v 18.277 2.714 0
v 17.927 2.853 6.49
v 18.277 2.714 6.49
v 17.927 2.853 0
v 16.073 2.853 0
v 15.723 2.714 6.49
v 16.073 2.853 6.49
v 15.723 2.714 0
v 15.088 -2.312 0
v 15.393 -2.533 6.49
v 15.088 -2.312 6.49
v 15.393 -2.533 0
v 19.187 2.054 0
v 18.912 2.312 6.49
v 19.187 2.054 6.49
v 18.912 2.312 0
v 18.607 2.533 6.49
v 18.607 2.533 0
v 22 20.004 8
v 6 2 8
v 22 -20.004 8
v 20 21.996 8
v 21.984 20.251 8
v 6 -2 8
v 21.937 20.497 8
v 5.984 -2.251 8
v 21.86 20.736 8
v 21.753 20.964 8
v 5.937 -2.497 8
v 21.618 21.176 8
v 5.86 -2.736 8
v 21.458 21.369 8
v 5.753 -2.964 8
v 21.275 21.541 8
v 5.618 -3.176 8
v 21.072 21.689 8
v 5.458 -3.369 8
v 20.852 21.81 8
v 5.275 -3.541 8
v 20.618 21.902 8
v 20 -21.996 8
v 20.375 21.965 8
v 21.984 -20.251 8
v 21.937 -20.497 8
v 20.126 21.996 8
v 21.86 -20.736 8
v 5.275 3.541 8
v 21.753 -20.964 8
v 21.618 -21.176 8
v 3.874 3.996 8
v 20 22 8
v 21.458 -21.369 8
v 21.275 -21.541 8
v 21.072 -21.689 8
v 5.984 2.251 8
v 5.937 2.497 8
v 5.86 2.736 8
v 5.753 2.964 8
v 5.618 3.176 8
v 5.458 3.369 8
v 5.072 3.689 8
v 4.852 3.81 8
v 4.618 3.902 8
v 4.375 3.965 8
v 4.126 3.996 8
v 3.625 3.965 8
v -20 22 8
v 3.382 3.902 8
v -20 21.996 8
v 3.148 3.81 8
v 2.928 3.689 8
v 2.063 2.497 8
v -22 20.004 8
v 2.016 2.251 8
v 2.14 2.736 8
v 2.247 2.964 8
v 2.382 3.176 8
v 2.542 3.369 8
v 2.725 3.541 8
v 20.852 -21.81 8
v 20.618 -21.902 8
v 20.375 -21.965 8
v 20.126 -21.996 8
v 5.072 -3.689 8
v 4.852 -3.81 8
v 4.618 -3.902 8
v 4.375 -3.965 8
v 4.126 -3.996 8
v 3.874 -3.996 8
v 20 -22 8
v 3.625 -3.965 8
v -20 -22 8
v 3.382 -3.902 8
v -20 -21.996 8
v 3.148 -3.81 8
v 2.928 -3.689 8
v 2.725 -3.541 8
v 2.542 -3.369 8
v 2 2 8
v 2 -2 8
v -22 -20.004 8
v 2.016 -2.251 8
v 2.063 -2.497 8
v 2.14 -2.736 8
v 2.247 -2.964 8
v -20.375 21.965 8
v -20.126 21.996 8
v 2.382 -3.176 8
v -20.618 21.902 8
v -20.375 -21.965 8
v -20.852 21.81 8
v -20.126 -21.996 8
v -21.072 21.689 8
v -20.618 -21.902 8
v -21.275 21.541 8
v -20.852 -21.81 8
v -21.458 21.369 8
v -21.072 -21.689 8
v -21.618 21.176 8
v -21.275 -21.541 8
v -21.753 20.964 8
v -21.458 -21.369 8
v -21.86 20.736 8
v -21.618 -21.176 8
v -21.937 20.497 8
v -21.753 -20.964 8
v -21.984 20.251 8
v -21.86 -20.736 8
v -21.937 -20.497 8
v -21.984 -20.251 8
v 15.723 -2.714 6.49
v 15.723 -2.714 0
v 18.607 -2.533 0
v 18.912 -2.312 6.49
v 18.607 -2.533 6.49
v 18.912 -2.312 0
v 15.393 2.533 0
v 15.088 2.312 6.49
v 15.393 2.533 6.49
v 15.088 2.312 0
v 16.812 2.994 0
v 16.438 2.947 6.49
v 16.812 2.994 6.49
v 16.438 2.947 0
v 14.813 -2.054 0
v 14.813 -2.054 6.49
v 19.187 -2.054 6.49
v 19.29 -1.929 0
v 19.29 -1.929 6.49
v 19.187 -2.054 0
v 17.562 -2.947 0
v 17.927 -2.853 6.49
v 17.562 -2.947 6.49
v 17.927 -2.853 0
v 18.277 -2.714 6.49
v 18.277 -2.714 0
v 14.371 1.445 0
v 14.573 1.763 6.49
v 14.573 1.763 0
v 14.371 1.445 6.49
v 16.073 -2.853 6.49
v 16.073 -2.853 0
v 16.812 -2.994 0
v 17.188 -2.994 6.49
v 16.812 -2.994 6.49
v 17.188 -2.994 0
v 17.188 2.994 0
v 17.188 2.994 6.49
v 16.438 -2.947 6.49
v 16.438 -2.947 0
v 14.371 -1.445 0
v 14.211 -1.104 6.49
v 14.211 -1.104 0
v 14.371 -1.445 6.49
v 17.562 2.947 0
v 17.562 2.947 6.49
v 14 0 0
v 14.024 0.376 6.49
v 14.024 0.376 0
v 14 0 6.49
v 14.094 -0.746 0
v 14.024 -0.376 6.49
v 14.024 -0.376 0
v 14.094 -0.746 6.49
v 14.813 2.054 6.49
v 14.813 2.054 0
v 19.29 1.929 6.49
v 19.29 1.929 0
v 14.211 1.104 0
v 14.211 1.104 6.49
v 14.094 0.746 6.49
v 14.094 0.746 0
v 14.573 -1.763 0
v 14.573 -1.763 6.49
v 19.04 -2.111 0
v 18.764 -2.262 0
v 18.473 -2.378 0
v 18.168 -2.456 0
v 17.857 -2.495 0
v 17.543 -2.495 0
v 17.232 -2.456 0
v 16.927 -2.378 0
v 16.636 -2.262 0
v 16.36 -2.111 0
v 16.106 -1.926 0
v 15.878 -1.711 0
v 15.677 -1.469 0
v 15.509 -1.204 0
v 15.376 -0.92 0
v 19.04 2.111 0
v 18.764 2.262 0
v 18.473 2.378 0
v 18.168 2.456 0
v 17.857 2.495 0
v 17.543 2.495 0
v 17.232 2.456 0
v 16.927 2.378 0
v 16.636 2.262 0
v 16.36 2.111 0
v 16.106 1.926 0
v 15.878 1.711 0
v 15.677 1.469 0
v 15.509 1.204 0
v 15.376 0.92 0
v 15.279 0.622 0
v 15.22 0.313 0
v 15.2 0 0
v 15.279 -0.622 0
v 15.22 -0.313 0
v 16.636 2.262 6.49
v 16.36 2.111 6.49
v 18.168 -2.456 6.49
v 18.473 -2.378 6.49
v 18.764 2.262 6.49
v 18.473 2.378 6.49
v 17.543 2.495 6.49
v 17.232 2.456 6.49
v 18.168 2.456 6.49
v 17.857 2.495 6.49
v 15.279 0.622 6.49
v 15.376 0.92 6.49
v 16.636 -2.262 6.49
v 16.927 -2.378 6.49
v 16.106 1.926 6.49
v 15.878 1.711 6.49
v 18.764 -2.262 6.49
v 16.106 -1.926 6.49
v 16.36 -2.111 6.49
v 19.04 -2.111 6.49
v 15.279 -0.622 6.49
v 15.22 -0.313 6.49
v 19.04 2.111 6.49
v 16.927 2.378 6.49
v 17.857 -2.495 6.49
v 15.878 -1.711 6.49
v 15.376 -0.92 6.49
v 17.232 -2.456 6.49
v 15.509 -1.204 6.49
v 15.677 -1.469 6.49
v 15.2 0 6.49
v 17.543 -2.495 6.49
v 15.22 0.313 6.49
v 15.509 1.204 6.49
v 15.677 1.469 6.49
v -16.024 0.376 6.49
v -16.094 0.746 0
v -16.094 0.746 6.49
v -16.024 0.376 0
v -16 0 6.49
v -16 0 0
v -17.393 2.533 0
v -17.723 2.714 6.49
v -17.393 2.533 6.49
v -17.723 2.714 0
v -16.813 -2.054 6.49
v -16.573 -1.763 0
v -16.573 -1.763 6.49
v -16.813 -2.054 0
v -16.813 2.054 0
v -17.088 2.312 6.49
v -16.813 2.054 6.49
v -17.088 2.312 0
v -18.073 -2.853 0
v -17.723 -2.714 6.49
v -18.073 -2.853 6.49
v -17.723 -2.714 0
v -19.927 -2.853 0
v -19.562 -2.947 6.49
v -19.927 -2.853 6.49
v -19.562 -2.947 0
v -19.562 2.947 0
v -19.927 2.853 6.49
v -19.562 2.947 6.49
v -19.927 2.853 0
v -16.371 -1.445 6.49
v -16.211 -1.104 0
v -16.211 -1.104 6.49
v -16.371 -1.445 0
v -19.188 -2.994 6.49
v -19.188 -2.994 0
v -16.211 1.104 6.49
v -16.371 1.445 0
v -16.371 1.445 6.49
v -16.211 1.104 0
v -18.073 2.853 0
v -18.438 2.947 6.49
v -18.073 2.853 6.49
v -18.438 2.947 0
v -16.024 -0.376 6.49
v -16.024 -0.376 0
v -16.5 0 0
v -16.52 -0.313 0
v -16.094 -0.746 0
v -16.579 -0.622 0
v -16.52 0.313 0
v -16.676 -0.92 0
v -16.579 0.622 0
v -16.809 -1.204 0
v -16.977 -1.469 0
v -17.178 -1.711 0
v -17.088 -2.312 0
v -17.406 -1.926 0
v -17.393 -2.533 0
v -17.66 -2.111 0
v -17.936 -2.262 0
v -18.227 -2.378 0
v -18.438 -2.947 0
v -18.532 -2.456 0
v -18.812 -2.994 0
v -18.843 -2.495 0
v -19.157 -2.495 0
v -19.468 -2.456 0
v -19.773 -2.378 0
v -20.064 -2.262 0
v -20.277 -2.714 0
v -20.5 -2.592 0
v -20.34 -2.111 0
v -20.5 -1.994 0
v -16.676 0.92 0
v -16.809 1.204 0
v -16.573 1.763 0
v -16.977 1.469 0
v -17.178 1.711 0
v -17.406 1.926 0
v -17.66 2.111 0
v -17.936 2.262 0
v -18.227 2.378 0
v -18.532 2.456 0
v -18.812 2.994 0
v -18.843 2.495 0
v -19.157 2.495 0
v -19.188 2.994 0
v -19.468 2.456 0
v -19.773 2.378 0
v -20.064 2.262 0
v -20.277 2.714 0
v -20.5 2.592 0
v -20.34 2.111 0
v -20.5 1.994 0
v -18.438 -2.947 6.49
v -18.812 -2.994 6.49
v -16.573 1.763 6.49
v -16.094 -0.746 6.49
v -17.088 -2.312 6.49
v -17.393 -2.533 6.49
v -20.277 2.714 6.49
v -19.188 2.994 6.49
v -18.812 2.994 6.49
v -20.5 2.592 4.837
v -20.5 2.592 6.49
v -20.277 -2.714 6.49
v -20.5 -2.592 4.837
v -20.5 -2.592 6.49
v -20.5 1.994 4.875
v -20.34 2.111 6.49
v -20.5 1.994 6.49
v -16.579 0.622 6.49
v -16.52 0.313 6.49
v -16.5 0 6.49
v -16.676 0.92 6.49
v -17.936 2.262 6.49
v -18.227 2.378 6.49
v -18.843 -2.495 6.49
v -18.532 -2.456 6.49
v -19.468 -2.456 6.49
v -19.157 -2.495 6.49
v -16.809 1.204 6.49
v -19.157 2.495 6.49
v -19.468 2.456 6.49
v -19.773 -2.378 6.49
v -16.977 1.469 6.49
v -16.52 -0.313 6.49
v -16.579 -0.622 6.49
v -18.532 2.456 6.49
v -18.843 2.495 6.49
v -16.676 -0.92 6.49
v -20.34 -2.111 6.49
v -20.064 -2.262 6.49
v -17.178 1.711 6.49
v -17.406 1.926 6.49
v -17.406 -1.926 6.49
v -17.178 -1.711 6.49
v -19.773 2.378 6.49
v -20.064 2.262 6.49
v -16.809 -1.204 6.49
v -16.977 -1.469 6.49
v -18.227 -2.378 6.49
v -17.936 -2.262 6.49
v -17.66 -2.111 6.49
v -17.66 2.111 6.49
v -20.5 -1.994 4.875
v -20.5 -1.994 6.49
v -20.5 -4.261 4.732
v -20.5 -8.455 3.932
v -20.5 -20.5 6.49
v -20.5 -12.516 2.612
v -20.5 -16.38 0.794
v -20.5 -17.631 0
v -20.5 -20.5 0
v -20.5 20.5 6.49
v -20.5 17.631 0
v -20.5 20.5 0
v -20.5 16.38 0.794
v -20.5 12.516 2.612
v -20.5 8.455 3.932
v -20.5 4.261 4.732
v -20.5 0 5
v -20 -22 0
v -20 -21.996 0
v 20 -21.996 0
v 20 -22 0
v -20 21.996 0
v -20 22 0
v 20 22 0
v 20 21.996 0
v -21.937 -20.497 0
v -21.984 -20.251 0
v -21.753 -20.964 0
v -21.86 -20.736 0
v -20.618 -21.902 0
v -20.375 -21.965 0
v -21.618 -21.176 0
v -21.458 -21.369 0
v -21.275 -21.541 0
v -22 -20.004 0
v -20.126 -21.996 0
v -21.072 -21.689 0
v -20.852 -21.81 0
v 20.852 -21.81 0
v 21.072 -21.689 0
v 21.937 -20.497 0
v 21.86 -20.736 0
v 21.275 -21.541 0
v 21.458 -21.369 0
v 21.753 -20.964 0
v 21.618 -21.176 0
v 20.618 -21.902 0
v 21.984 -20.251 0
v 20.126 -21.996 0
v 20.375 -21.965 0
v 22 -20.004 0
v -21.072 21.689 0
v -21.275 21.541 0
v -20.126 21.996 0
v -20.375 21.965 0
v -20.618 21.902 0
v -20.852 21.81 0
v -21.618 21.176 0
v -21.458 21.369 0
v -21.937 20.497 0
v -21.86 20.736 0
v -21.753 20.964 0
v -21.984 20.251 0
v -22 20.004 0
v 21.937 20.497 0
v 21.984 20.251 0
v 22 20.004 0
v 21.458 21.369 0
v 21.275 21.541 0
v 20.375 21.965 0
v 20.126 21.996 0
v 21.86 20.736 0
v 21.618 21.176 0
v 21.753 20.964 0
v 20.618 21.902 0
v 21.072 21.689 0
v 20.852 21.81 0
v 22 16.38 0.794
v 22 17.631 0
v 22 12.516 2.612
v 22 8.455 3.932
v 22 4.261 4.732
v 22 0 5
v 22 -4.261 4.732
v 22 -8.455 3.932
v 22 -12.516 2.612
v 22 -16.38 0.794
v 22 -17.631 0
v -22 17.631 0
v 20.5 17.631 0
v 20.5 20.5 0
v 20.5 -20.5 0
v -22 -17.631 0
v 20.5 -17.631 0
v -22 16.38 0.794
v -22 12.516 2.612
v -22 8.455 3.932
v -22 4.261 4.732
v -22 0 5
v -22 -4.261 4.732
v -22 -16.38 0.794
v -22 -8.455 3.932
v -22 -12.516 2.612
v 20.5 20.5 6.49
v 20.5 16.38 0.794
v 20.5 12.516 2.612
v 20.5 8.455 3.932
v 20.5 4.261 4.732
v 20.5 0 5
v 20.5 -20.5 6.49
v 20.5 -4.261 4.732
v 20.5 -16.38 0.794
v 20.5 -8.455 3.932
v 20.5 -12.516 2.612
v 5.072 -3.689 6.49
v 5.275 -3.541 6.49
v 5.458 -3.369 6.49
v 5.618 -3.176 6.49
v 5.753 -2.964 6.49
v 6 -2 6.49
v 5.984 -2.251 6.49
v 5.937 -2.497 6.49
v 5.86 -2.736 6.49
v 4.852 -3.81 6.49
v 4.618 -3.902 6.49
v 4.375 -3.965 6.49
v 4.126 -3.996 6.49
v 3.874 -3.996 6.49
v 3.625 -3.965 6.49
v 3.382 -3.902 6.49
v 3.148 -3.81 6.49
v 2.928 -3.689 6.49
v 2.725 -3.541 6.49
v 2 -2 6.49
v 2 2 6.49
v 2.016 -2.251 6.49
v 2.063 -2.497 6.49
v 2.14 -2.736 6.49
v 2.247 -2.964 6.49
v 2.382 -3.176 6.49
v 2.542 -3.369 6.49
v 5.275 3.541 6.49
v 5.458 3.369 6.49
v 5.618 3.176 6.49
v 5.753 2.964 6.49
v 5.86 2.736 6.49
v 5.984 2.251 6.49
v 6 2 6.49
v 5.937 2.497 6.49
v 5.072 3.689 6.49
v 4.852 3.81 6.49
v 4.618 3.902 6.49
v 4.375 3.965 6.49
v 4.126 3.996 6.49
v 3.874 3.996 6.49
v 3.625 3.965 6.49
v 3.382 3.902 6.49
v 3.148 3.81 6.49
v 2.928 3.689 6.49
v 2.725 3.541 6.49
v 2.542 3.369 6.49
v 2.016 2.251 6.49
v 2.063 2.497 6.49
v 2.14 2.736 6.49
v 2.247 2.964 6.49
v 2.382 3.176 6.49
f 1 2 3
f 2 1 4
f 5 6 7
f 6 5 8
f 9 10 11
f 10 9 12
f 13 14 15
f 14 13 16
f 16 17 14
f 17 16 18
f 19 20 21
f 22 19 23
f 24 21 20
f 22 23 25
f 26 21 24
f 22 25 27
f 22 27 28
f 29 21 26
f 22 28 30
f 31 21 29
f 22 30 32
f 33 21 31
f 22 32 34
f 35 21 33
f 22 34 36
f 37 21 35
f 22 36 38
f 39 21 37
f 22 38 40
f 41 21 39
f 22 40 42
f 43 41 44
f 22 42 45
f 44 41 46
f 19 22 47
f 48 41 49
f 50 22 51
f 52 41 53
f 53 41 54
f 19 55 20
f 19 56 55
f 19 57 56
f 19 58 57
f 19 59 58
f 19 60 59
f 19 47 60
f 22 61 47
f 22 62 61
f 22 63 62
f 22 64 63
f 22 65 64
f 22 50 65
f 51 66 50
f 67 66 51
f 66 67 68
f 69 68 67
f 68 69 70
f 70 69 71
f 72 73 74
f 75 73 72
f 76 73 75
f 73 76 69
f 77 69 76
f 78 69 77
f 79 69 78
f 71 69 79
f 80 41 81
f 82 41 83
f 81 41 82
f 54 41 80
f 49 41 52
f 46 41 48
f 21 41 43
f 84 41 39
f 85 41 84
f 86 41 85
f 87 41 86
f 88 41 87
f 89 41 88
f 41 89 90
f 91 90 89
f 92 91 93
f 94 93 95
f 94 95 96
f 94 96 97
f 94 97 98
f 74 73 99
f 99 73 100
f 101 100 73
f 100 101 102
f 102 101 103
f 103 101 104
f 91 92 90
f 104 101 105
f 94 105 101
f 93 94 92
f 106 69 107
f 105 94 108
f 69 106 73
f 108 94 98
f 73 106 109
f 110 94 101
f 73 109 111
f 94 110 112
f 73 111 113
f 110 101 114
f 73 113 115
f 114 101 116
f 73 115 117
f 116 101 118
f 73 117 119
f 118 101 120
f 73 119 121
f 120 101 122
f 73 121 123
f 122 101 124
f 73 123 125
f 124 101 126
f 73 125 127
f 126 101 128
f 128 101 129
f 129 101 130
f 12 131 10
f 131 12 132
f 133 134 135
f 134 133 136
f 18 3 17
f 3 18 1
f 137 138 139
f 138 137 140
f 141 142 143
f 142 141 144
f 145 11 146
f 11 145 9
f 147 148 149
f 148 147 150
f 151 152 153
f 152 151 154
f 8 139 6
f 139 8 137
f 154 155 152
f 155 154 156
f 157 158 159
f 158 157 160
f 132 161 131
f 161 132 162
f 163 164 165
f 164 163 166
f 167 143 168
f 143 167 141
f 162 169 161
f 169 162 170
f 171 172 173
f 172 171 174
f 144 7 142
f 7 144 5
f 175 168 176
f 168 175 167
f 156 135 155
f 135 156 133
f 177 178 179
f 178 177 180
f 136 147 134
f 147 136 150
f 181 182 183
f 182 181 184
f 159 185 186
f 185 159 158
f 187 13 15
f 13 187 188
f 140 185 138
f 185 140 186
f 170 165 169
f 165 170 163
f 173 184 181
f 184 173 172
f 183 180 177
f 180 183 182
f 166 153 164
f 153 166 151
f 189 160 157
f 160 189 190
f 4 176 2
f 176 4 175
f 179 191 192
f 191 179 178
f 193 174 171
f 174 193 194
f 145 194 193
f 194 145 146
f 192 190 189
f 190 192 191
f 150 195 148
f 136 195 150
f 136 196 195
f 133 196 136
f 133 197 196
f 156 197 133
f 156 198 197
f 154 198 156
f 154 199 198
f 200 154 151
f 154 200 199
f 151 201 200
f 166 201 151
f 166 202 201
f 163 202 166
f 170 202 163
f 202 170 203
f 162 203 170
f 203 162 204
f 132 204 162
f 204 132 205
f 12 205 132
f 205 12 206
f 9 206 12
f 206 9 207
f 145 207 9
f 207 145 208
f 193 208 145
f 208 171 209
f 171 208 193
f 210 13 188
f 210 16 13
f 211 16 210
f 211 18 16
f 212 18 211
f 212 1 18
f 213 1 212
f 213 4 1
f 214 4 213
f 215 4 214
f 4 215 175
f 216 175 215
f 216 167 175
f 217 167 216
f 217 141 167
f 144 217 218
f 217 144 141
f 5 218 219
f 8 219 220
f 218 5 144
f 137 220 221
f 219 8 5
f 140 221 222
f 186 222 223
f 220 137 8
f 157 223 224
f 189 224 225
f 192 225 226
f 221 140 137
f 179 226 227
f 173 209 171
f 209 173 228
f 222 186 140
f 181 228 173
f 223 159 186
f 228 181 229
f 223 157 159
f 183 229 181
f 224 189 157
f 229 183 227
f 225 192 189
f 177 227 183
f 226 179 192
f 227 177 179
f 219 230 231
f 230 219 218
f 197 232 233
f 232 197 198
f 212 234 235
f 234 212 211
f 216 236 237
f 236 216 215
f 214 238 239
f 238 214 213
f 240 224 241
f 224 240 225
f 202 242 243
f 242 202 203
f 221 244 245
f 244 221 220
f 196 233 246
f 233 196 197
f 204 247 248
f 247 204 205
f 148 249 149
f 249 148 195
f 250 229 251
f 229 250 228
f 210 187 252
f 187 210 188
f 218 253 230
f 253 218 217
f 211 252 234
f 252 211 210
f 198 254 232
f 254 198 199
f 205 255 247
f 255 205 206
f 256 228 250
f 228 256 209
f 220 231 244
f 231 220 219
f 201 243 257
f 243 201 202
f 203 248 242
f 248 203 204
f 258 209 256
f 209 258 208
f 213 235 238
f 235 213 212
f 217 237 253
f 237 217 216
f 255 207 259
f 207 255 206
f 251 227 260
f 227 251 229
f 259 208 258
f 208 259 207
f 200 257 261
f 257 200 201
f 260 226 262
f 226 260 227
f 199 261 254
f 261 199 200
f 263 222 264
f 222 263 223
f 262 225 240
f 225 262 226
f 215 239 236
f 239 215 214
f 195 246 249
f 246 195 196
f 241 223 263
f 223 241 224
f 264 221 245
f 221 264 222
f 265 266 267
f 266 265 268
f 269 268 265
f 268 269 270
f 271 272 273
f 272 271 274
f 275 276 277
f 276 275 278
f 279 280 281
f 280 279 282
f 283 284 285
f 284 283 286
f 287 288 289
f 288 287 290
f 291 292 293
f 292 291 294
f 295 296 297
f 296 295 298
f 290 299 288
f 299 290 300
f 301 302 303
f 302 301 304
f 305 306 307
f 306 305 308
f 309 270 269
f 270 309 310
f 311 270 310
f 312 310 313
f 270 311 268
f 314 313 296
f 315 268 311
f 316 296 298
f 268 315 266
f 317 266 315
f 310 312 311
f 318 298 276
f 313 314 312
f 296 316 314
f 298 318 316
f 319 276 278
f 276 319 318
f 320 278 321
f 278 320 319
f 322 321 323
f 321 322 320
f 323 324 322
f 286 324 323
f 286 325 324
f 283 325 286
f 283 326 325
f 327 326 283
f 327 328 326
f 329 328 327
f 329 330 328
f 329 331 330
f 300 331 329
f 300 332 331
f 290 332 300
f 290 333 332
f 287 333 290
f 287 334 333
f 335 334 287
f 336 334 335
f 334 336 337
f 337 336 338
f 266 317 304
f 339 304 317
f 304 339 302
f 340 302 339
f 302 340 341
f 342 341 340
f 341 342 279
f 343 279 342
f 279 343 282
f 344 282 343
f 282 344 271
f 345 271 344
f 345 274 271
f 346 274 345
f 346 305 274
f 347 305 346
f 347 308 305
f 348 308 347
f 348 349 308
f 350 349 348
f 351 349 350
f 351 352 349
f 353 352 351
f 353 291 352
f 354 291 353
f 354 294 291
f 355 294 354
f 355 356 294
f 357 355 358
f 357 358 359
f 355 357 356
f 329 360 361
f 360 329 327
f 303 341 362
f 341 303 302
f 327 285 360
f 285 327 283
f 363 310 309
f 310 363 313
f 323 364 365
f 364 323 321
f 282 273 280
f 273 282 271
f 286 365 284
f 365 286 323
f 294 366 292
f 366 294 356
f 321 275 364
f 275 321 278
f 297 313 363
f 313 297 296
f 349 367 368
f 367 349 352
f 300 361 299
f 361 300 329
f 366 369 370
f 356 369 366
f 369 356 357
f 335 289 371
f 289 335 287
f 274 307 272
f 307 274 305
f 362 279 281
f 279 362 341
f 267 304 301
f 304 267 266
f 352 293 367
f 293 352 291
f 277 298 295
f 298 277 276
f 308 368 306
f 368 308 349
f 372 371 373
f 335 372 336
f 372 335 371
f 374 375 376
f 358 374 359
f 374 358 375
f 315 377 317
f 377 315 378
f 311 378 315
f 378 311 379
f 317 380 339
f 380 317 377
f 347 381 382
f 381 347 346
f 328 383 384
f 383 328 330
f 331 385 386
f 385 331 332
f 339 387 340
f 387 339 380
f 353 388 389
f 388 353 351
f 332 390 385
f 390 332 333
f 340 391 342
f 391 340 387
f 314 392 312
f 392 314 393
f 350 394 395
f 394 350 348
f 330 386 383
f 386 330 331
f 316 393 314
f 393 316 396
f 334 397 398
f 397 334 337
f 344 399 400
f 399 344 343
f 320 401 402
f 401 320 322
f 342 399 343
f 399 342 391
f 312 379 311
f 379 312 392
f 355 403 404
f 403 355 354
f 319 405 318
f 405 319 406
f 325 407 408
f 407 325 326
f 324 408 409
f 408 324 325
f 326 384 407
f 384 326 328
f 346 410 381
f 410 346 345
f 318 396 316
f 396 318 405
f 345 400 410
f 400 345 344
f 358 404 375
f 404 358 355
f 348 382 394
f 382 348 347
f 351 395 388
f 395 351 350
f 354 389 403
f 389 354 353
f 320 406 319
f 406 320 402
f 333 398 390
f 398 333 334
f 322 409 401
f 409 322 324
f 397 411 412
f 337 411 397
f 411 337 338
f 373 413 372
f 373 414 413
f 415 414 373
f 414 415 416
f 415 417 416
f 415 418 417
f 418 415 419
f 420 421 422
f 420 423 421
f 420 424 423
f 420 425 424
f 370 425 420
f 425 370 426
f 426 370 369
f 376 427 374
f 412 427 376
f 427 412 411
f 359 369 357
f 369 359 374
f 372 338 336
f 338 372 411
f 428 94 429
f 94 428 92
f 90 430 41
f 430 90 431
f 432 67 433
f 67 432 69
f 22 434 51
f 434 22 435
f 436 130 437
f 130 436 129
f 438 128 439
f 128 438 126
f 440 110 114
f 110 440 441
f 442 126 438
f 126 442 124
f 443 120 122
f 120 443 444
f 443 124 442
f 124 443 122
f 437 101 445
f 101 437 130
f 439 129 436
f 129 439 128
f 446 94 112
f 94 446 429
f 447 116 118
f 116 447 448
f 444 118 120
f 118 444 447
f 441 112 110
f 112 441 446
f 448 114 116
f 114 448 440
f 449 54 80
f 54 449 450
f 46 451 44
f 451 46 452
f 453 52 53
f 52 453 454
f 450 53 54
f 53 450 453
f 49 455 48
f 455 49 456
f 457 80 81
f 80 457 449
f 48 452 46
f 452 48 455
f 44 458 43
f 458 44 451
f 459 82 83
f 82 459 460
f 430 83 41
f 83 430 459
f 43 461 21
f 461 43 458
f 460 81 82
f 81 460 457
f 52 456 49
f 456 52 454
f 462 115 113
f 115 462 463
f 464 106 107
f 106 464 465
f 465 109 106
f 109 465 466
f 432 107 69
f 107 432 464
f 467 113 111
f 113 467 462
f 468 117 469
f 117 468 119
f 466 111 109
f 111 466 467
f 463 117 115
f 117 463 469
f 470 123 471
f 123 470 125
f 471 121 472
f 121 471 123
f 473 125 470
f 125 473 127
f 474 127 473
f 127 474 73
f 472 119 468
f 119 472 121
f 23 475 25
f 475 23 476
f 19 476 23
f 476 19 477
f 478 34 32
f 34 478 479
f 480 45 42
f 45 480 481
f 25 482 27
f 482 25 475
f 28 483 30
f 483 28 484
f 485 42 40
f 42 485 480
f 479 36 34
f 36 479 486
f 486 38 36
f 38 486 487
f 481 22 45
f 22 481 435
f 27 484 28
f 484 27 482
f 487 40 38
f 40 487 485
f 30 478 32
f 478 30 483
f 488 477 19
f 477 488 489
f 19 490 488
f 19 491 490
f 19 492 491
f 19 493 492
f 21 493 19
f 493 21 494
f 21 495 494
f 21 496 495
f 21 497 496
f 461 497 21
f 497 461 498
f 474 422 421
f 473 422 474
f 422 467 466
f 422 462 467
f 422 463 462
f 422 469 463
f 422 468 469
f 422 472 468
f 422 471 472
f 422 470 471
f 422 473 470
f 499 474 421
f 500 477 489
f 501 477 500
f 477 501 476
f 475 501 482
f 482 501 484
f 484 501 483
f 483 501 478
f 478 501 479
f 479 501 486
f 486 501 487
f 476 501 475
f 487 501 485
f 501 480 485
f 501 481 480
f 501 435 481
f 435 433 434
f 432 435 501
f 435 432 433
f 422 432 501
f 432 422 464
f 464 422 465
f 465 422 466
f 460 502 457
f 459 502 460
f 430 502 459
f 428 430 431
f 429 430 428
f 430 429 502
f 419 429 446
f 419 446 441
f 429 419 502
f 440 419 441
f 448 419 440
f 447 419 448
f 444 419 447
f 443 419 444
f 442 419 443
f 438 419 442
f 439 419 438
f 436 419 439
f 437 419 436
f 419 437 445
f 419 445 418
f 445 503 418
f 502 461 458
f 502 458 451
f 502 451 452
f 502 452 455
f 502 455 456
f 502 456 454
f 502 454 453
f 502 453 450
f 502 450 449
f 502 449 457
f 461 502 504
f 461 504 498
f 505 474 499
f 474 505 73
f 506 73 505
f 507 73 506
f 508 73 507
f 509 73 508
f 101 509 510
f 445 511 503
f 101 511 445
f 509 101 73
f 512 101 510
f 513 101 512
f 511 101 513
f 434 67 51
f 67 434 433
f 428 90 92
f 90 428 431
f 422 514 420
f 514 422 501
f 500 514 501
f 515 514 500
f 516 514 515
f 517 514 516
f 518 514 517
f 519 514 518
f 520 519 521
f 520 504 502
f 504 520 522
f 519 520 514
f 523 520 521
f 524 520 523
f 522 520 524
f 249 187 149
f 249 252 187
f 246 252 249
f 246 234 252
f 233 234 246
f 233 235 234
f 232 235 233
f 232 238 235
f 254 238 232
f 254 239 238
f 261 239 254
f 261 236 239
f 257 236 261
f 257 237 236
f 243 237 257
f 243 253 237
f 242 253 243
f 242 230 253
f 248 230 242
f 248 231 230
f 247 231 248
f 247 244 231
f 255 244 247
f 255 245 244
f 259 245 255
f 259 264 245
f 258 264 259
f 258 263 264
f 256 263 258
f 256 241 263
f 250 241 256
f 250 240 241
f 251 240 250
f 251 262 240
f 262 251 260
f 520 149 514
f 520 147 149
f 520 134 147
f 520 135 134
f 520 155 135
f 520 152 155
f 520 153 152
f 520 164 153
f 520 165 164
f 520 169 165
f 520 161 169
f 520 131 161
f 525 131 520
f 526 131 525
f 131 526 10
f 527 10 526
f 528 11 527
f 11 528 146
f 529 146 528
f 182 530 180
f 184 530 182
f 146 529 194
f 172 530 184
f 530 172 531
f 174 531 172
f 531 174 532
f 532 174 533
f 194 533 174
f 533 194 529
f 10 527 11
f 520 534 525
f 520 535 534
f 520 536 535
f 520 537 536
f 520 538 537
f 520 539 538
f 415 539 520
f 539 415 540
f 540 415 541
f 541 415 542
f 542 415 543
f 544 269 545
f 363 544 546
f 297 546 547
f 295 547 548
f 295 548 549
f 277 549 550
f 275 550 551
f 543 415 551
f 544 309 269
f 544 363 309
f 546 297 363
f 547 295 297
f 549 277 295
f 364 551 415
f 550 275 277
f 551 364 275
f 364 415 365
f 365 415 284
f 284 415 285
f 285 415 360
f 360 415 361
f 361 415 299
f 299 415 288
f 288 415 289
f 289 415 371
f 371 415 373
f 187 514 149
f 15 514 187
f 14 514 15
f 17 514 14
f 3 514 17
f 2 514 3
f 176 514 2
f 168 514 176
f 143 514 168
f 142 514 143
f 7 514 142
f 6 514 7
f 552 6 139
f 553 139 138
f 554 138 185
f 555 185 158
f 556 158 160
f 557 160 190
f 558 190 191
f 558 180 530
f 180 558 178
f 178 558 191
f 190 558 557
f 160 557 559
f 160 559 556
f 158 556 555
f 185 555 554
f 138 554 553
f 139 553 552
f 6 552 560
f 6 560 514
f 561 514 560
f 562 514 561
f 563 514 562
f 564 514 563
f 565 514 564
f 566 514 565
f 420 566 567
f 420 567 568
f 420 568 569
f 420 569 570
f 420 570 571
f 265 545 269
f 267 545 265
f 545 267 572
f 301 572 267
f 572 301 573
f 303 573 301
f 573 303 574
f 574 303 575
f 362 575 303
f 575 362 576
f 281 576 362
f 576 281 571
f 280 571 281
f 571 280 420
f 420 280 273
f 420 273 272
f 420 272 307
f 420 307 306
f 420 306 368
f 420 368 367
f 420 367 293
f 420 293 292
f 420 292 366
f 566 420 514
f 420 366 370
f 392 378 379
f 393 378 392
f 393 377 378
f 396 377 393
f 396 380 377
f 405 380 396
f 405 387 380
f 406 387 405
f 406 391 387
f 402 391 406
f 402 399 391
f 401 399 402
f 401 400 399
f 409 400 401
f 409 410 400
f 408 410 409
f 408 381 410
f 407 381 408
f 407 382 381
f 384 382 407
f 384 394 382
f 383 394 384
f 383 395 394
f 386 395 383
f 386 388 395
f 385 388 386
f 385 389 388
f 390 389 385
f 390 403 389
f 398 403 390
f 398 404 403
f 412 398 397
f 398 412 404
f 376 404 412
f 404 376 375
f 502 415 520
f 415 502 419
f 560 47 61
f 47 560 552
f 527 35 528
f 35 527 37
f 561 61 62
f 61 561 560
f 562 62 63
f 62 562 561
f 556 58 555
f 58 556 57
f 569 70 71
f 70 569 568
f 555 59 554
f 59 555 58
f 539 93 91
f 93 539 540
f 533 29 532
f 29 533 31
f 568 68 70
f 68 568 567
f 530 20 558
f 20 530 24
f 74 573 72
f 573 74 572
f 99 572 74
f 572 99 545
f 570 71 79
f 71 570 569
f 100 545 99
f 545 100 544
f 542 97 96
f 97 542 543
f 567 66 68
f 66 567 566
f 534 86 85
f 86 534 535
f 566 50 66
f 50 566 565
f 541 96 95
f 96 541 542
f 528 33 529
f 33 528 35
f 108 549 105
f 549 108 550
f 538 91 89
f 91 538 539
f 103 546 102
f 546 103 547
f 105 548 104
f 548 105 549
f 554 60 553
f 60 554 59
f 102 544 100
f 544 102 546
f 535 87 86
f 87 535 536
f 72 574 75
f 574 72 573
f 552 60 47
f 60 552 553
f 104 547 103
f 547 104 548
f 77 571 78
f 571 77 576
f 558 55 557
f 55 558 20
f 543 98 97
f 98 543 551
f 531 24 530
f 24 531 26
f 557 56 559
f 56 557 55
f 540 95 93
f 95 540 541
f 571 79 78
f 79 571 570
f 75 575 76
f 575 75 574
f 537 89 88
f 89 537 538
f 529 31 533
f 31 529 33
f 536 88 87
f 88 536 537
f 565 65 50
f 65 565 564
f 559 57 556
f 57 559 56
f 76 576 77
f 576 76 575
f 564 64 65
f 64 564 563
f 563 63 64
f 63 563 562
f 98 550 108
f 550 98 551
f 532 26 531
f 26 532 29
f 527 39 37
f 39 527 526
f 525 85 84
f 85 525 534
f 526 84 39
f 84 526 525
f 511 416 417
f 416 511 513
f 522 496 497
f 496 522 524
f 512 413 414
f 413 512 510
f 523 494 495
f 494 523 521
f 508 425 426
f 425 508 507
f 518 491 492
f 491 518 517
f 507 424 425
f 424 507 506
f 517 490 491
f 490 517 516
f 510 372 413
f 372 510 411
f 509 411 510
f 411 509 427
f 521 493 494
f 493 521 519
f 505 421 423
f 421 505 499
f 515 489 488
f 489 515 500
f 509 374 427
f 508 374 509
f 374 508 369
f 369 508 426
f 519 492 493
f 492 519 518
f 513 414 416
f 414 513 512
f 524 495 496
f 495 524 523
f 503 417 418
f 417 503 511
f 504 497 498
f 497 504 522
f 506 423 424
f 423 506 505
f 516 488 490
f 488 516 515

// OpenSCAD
TangentSize=44;
TangentOuterR=150;
TangentSide=8;
TangentAngle=0;
TangentRDepth=1.5;
TangenWallThickness=1.5;
manifoldfix=0.01;
FiletTangentR=2;
MagnetCylinderR=2.5;
MagnetCylinderThickness=0.5;
MagnetCylinderOffset=2.0;
ScrewDistance=38;
MagnetHolderOffset=-0.7;
LockHoleOffset = (TangentSize/2-18);
LockHoleLength= 8;
LockHoleD=4;
$fn=50;




Tangent();

module Tangent(){
difference(){
translate([TangentSize/2-MagnetCylinderR-MagnetCylinderThickness-MagnetCylinderOffset,0,0])
cylinder(h=TangentSide, r=MagnetCylinderR+MagnetCylinderThickness,$fn=50, center=false);
    
translate([TangentSize/2-MagnetCylinderR-MagnetCylinderThickness-MagnetCylinderOffset-MagnetHolderOffset,0,-manifoldfix])
cylinder(h=TangentSide, r=MagnetCylinderR,$fn=50, center=false);
}




difference(){
translate([-ScrewDistance/2,0,0])
cylinder(h=TangentSide, r=MagnetCylinderR+MagnetCylinderThickness,$fn=50, center=false);
    
translate([-ScrewDistance/2,0,-manifoldfix])
cylinder(h=TangentSide, r=MagnetCylinderR,$fn=50, center=false);

translate([-ScrewDistance/2-TangentSide-1.5,-TangentSide/2,-manifoldfix])
cube([TangentSide,TangentSide,TangentSide], center=false);

}






//difference(){
//translate([-(TangentSize/2-MagnetCylinderR-MagnetCylinderThickness-MagnetCylinderOffset),0,0])
//cylinder(h=TangentSide, r=MagnetCylinderR+MagnetCylinderThickness,$fn=50, center=false);
    
//translate([-(TangentSize/2-MagnetCylinderR-MagnetCylinderThickness-MagnetCylinderOffset-MagnetHolderOffset),0,-manifoldfix])
//cylinder(h=TangentSide, r=MagnetCylinderR,$fn=50, center=false);
//}

difference(){
translate([0,0,TangentSide/2])
cube([TangentSize,TangentSize,TangentSide], center=true);


translate([0,0,-manifoldfix])
rotate([0,0,45])
cylinder(h=(TangentSide-TangenWallThickness), r=sqrt(2)*(TangentSize-2*TangenWallThickness)/2,$fn=4, center=false);


// Lock Hole
    hull() {
    translate([LockHoleOffset,LockHoleLength/2-LockHoleD/2,0]) 
        cylinder(h=TangentSide*2, d=LockHoleD, center=false);
     translate([LockHoleOffset,-(LockHoleLength/2-LockHoleD/2),0]) 
        cylinder(h=TangentSide*2, d=LockHoleD, center=false);
}
    



// Magnet
//    translate([TangentSize/2-MagnetCylinderR-MagnetCylinderThickness-MagnetCylinderOffset,0,-TangenWallThickness])
//cylinder(h=TangentSide, r=MagnetCylinderR,$fn=50, center=false);
    
//    translate([-(TangentSize/2-MagnetCylinderR-MagnetCylinderThickness-MagnetCylinderOffset),0,-TangenWallThickness])
//cylinder(h=TangentSide, r=MagnetCylinderR,$fn=50, center=false);
    
    
// Cylinder center
translate([0,0,-29])
  rotate([0,90,0])
cylinder(h=TangentSize*2, r=34,$fn=50, center=true);  
    

// Angled sides of tagent
translate([0,-TangentSize/2-10/2,0])
rotate([-TangentAngle,0,0])
cube([TangentSize+manifoldfix,10,TangentSide*3], center =true);
    
translate([0,+TangentSize/2+10/2,0])
rotate([TangentAngle,0,0])
cube([TangentSize+manifoldfix,10,TangentSide*3], center =true);
// Filet of corners
TangentCornerFilet();

}



}


// Corner filet 
module TangentCornerFilet(){
difference(){
TangentCornerFiletPrep();
translate([-TangentSize/2+FiletTangentR,-TangentSize/2+FiletTangentR,0])
rotate([-TangentAngle,0,0])
cylinder(h=TangentSide*3,r=FiletTangentR,$fn=50,center=true);
translate([TangentSize/2-FiletTangentR,-TangentSize/2+FiletTangentR,0])
rotate([-TangentAngle,0,0])
cylinder(h=TangentSide*3,r=FiletTangentR,$fn=50,center=true);
translate([-TangentSize/2+FiletTangentR,TangentSize/2-FiletTangentR,0])
rotate([TangentAngle,0,0])
cylinder(h=TangentSide*3,r=FiletTangentR,$fn=50,center=true);
translate([TangentSize/2-FiletTangentR,TangentSize/2-FiletTangentR,0])
rotate([TangentAngle,0,0])
cylinder(h=TangentSide*3,r=FiletTangentR,$fn=50,center=true);
}
}

module TangentCornerFiletPrep(){
    translate([-TangentSize/2,-TangentSize/2,0])
rotate([-TangentAngle,0,0])
cylinder(h=TangentSide*3,r=FiletTangentR,$fn=50,center=true);
translate([TangentSize/2,-TangentSize/2,0])
rotate([-TangentAngle,0,0])
cylinder(h=TangentSide*3,r=FiletTangentR,$fn=50,center=true);
translate([-TangentSize/2,TangentSize/2,0])
rotate([TangentAngle,0,0])
cylinder(h=TangentSide*3,r=FiletTangentR,$fn=50,center=true);
translate([TangentSize/2,TangentSize/2,0])
rotate([TangentAngle,0,0])
cylinder(h=TangentSide*3,r=FiletTangentR,$fn=50,center=true);
}
